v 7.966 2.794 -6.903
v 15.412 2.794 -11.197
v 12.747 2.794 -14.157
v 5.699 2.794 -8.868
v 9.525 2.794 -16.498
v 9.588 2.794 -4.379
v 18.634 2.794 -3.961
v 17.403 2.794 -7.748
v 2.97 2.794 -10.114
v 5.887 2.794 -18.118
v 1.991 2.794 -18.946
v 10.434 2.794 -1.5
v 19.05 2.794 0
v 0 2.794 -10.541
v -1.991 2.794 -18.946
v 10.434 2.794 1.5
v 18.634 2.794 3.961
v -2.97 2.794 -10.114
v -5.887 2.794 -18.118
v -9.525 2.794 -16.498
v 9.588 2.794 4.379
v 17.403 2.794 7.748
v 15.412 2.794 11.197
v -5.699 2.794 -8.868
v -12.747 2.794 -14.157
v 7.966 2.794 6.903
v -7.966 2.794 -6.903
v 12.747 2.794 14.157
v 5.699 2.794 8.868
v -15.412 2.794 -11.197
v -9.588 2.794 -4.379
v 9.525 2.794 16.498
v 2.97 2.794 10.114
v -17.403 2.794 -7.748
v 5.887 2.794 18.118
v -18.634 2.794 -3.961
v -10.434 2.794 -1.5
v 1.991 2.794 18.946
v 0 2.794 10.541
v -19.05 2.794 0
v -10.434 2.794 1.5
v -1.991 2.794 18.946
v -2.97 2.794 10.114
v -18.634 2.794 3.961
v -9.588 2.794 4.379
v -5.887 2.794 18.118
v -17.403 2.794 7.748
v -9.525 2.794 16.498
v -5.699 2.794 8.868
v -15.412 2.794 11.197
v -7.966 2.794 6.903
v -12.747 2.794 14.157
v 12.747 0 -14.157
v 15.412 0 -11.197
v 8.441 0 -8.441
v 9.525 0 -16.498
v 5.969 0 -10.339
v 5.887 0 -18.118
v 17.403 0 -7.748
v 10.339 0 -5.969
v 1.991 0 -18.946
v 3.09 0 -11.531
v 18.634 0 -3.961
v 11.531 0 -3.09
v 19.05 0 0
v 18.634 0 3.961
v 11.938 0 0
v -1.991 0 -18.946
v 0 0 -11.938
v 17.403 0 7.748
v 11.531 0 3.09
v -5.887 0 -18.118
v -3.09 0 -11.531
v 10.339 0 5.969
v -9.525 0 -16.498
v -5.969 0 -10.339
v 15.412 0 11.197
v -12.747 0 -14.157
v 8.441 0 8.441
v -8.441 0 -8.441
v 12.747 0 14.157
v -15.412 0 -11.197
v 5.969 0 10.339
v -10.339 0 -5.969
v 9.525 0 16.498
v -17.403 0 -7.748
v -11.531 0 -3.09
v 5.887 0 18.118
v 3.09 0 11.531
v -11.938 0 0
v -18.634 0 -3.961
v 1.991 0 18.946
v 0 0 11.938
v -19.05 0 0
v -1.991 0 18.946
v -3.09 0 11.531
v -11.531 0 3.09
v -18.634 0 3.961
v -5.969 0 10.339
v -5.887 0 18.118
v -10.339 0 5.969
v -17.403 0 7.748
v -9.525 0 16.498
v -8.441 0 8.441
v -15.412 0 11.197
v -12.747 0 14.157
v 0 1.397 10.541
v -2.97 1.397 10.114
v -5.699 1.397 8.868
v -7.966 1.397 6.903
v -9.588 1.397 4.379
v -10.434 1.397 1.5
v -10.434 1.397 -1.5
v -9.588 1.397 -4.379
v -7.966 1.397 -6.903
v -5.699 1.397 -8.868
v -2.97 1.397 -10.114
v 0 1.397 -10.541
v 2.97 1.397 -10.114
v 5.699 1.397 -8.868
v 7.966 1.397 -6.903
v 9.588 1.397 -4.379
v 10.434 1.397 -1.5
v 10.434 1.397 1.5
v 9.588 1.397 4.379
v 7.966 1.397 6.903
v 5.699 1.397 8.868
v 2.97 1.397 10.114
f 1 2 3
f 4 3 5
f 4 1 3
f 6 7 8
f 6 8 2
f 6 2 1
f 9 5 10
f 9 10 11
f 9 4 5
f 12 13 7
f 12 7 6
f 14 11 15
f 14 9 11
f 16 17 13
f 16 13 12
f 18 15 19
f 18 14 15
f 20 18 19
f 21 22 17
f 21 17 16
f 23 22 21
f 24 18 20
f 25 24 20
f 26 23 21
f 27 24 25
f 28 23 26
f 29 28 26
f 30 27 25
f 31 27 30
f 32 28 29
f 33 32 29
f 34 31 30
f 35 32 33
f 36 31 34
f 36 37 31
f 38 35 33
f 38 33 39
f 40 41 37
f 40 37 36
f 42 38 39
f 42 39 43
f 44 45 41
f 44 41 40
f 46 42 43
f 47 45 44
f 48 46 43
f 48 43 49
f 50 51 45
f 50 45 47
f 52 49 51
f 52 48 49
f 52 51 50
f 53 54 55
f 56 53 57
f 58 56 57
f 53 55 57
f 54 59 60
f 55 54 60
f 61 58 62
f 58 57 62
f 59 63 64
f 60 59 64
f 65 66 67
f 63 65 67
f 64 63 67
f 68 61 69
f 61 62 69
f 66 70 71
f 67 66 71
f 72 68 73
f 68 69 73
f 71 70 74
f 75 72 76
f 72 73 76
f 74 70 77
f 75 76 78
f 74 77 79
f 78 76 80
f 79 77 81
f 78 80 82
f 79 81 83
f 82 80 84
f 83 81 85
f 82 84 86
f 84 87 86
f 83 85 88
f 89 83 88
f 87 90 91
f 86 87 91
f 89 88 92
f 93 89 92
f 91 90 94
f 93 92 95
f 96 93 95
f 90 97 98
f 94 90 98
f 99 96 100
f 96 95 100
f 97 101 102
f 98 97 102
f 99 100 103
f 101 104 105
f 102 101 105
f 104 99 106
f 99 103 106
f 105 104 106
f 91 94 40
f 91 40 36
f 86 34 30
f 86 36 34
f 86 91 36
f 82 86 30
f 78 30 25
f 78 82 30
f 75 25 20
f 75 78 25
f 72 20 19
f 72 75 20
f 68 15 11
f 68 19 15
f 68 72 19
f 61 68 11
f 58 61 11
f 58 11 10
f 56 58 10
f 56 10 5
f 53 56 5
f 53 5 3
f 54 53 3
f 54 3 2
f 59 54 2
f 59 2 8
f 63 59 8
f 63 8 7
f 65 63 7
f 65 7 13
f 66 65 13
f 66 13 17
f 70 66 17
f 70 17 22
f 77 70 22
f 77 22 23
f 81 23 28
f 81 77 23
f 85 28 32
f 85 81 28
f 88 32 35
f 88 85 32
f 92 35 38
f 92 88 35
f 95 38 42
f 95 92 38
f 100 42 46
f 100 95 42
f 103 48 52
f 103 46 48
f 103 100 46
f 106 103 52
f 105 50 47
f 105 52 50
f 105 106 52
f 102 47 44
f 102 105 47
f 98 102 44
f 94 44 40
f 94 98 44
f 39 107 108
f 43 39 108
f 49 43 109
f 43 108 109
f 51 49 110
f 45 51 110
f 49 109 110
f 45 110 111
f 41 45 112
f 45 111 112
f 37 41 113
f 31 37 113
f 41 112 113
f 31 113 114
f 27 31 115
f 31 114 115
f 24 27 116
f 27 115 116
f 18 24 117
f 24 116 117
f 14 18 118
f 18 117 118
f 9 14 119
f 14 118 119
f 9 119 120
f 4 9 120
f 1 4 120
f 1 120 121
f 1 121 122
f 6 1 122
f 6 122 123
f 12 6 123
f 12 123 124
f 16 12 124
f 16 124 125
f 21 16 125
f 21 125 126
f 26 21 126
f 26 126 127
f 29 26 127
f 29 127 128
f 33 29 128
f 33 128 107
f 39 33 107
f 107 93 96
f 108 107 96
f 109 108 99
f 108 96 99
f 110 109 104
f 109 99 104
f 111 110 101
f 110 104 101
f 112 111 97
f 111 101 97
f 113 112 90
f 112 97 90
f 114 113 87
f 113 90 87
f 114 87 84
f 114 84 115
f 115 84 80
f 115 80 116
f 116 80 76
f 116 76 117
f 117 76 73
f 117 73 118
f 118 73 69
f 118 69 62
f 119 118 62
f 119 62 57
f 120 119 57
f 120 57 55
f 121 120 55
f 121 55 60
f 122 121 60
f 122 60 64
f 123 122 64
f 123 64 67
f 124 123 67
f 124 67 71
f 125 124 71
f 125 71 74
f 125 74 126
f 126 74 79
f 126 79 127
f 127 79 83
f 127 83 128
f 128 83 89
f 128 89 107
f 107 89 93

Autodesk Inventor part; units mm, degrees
ref_plane "YZ Plane" through (0, 0, 0) normal (1, 0, 0) x (0, 1, 0)
ref_plane "XZ Plane" through (0, 0, 0) normal (0, 1, 0) x (-1, 0, 0)
ref_plane "XY Plane" through (0, 0, 0) normal (0, 0, 1) x (1, 0, 0)
sketch "Sketch1" plane through (0, 0, 0) normal (0, 1, 0) x (-1, 0, 0)
  circle A0 centre (0, 0) radius 19.05
  dimension "d0" = 38.1
extrude "Extrusion1" add sketch "Sketch1" along normal blind 2.794
hole "Hole1" at (0, 2.794, 0) direction (0, -1, 0) diameter 21.082 end through all
chamfer "Chamfer1" distance 1.397 angle 45 1 edges at (0, 0, -10.541)
properties part number "Switch Hole Test"
